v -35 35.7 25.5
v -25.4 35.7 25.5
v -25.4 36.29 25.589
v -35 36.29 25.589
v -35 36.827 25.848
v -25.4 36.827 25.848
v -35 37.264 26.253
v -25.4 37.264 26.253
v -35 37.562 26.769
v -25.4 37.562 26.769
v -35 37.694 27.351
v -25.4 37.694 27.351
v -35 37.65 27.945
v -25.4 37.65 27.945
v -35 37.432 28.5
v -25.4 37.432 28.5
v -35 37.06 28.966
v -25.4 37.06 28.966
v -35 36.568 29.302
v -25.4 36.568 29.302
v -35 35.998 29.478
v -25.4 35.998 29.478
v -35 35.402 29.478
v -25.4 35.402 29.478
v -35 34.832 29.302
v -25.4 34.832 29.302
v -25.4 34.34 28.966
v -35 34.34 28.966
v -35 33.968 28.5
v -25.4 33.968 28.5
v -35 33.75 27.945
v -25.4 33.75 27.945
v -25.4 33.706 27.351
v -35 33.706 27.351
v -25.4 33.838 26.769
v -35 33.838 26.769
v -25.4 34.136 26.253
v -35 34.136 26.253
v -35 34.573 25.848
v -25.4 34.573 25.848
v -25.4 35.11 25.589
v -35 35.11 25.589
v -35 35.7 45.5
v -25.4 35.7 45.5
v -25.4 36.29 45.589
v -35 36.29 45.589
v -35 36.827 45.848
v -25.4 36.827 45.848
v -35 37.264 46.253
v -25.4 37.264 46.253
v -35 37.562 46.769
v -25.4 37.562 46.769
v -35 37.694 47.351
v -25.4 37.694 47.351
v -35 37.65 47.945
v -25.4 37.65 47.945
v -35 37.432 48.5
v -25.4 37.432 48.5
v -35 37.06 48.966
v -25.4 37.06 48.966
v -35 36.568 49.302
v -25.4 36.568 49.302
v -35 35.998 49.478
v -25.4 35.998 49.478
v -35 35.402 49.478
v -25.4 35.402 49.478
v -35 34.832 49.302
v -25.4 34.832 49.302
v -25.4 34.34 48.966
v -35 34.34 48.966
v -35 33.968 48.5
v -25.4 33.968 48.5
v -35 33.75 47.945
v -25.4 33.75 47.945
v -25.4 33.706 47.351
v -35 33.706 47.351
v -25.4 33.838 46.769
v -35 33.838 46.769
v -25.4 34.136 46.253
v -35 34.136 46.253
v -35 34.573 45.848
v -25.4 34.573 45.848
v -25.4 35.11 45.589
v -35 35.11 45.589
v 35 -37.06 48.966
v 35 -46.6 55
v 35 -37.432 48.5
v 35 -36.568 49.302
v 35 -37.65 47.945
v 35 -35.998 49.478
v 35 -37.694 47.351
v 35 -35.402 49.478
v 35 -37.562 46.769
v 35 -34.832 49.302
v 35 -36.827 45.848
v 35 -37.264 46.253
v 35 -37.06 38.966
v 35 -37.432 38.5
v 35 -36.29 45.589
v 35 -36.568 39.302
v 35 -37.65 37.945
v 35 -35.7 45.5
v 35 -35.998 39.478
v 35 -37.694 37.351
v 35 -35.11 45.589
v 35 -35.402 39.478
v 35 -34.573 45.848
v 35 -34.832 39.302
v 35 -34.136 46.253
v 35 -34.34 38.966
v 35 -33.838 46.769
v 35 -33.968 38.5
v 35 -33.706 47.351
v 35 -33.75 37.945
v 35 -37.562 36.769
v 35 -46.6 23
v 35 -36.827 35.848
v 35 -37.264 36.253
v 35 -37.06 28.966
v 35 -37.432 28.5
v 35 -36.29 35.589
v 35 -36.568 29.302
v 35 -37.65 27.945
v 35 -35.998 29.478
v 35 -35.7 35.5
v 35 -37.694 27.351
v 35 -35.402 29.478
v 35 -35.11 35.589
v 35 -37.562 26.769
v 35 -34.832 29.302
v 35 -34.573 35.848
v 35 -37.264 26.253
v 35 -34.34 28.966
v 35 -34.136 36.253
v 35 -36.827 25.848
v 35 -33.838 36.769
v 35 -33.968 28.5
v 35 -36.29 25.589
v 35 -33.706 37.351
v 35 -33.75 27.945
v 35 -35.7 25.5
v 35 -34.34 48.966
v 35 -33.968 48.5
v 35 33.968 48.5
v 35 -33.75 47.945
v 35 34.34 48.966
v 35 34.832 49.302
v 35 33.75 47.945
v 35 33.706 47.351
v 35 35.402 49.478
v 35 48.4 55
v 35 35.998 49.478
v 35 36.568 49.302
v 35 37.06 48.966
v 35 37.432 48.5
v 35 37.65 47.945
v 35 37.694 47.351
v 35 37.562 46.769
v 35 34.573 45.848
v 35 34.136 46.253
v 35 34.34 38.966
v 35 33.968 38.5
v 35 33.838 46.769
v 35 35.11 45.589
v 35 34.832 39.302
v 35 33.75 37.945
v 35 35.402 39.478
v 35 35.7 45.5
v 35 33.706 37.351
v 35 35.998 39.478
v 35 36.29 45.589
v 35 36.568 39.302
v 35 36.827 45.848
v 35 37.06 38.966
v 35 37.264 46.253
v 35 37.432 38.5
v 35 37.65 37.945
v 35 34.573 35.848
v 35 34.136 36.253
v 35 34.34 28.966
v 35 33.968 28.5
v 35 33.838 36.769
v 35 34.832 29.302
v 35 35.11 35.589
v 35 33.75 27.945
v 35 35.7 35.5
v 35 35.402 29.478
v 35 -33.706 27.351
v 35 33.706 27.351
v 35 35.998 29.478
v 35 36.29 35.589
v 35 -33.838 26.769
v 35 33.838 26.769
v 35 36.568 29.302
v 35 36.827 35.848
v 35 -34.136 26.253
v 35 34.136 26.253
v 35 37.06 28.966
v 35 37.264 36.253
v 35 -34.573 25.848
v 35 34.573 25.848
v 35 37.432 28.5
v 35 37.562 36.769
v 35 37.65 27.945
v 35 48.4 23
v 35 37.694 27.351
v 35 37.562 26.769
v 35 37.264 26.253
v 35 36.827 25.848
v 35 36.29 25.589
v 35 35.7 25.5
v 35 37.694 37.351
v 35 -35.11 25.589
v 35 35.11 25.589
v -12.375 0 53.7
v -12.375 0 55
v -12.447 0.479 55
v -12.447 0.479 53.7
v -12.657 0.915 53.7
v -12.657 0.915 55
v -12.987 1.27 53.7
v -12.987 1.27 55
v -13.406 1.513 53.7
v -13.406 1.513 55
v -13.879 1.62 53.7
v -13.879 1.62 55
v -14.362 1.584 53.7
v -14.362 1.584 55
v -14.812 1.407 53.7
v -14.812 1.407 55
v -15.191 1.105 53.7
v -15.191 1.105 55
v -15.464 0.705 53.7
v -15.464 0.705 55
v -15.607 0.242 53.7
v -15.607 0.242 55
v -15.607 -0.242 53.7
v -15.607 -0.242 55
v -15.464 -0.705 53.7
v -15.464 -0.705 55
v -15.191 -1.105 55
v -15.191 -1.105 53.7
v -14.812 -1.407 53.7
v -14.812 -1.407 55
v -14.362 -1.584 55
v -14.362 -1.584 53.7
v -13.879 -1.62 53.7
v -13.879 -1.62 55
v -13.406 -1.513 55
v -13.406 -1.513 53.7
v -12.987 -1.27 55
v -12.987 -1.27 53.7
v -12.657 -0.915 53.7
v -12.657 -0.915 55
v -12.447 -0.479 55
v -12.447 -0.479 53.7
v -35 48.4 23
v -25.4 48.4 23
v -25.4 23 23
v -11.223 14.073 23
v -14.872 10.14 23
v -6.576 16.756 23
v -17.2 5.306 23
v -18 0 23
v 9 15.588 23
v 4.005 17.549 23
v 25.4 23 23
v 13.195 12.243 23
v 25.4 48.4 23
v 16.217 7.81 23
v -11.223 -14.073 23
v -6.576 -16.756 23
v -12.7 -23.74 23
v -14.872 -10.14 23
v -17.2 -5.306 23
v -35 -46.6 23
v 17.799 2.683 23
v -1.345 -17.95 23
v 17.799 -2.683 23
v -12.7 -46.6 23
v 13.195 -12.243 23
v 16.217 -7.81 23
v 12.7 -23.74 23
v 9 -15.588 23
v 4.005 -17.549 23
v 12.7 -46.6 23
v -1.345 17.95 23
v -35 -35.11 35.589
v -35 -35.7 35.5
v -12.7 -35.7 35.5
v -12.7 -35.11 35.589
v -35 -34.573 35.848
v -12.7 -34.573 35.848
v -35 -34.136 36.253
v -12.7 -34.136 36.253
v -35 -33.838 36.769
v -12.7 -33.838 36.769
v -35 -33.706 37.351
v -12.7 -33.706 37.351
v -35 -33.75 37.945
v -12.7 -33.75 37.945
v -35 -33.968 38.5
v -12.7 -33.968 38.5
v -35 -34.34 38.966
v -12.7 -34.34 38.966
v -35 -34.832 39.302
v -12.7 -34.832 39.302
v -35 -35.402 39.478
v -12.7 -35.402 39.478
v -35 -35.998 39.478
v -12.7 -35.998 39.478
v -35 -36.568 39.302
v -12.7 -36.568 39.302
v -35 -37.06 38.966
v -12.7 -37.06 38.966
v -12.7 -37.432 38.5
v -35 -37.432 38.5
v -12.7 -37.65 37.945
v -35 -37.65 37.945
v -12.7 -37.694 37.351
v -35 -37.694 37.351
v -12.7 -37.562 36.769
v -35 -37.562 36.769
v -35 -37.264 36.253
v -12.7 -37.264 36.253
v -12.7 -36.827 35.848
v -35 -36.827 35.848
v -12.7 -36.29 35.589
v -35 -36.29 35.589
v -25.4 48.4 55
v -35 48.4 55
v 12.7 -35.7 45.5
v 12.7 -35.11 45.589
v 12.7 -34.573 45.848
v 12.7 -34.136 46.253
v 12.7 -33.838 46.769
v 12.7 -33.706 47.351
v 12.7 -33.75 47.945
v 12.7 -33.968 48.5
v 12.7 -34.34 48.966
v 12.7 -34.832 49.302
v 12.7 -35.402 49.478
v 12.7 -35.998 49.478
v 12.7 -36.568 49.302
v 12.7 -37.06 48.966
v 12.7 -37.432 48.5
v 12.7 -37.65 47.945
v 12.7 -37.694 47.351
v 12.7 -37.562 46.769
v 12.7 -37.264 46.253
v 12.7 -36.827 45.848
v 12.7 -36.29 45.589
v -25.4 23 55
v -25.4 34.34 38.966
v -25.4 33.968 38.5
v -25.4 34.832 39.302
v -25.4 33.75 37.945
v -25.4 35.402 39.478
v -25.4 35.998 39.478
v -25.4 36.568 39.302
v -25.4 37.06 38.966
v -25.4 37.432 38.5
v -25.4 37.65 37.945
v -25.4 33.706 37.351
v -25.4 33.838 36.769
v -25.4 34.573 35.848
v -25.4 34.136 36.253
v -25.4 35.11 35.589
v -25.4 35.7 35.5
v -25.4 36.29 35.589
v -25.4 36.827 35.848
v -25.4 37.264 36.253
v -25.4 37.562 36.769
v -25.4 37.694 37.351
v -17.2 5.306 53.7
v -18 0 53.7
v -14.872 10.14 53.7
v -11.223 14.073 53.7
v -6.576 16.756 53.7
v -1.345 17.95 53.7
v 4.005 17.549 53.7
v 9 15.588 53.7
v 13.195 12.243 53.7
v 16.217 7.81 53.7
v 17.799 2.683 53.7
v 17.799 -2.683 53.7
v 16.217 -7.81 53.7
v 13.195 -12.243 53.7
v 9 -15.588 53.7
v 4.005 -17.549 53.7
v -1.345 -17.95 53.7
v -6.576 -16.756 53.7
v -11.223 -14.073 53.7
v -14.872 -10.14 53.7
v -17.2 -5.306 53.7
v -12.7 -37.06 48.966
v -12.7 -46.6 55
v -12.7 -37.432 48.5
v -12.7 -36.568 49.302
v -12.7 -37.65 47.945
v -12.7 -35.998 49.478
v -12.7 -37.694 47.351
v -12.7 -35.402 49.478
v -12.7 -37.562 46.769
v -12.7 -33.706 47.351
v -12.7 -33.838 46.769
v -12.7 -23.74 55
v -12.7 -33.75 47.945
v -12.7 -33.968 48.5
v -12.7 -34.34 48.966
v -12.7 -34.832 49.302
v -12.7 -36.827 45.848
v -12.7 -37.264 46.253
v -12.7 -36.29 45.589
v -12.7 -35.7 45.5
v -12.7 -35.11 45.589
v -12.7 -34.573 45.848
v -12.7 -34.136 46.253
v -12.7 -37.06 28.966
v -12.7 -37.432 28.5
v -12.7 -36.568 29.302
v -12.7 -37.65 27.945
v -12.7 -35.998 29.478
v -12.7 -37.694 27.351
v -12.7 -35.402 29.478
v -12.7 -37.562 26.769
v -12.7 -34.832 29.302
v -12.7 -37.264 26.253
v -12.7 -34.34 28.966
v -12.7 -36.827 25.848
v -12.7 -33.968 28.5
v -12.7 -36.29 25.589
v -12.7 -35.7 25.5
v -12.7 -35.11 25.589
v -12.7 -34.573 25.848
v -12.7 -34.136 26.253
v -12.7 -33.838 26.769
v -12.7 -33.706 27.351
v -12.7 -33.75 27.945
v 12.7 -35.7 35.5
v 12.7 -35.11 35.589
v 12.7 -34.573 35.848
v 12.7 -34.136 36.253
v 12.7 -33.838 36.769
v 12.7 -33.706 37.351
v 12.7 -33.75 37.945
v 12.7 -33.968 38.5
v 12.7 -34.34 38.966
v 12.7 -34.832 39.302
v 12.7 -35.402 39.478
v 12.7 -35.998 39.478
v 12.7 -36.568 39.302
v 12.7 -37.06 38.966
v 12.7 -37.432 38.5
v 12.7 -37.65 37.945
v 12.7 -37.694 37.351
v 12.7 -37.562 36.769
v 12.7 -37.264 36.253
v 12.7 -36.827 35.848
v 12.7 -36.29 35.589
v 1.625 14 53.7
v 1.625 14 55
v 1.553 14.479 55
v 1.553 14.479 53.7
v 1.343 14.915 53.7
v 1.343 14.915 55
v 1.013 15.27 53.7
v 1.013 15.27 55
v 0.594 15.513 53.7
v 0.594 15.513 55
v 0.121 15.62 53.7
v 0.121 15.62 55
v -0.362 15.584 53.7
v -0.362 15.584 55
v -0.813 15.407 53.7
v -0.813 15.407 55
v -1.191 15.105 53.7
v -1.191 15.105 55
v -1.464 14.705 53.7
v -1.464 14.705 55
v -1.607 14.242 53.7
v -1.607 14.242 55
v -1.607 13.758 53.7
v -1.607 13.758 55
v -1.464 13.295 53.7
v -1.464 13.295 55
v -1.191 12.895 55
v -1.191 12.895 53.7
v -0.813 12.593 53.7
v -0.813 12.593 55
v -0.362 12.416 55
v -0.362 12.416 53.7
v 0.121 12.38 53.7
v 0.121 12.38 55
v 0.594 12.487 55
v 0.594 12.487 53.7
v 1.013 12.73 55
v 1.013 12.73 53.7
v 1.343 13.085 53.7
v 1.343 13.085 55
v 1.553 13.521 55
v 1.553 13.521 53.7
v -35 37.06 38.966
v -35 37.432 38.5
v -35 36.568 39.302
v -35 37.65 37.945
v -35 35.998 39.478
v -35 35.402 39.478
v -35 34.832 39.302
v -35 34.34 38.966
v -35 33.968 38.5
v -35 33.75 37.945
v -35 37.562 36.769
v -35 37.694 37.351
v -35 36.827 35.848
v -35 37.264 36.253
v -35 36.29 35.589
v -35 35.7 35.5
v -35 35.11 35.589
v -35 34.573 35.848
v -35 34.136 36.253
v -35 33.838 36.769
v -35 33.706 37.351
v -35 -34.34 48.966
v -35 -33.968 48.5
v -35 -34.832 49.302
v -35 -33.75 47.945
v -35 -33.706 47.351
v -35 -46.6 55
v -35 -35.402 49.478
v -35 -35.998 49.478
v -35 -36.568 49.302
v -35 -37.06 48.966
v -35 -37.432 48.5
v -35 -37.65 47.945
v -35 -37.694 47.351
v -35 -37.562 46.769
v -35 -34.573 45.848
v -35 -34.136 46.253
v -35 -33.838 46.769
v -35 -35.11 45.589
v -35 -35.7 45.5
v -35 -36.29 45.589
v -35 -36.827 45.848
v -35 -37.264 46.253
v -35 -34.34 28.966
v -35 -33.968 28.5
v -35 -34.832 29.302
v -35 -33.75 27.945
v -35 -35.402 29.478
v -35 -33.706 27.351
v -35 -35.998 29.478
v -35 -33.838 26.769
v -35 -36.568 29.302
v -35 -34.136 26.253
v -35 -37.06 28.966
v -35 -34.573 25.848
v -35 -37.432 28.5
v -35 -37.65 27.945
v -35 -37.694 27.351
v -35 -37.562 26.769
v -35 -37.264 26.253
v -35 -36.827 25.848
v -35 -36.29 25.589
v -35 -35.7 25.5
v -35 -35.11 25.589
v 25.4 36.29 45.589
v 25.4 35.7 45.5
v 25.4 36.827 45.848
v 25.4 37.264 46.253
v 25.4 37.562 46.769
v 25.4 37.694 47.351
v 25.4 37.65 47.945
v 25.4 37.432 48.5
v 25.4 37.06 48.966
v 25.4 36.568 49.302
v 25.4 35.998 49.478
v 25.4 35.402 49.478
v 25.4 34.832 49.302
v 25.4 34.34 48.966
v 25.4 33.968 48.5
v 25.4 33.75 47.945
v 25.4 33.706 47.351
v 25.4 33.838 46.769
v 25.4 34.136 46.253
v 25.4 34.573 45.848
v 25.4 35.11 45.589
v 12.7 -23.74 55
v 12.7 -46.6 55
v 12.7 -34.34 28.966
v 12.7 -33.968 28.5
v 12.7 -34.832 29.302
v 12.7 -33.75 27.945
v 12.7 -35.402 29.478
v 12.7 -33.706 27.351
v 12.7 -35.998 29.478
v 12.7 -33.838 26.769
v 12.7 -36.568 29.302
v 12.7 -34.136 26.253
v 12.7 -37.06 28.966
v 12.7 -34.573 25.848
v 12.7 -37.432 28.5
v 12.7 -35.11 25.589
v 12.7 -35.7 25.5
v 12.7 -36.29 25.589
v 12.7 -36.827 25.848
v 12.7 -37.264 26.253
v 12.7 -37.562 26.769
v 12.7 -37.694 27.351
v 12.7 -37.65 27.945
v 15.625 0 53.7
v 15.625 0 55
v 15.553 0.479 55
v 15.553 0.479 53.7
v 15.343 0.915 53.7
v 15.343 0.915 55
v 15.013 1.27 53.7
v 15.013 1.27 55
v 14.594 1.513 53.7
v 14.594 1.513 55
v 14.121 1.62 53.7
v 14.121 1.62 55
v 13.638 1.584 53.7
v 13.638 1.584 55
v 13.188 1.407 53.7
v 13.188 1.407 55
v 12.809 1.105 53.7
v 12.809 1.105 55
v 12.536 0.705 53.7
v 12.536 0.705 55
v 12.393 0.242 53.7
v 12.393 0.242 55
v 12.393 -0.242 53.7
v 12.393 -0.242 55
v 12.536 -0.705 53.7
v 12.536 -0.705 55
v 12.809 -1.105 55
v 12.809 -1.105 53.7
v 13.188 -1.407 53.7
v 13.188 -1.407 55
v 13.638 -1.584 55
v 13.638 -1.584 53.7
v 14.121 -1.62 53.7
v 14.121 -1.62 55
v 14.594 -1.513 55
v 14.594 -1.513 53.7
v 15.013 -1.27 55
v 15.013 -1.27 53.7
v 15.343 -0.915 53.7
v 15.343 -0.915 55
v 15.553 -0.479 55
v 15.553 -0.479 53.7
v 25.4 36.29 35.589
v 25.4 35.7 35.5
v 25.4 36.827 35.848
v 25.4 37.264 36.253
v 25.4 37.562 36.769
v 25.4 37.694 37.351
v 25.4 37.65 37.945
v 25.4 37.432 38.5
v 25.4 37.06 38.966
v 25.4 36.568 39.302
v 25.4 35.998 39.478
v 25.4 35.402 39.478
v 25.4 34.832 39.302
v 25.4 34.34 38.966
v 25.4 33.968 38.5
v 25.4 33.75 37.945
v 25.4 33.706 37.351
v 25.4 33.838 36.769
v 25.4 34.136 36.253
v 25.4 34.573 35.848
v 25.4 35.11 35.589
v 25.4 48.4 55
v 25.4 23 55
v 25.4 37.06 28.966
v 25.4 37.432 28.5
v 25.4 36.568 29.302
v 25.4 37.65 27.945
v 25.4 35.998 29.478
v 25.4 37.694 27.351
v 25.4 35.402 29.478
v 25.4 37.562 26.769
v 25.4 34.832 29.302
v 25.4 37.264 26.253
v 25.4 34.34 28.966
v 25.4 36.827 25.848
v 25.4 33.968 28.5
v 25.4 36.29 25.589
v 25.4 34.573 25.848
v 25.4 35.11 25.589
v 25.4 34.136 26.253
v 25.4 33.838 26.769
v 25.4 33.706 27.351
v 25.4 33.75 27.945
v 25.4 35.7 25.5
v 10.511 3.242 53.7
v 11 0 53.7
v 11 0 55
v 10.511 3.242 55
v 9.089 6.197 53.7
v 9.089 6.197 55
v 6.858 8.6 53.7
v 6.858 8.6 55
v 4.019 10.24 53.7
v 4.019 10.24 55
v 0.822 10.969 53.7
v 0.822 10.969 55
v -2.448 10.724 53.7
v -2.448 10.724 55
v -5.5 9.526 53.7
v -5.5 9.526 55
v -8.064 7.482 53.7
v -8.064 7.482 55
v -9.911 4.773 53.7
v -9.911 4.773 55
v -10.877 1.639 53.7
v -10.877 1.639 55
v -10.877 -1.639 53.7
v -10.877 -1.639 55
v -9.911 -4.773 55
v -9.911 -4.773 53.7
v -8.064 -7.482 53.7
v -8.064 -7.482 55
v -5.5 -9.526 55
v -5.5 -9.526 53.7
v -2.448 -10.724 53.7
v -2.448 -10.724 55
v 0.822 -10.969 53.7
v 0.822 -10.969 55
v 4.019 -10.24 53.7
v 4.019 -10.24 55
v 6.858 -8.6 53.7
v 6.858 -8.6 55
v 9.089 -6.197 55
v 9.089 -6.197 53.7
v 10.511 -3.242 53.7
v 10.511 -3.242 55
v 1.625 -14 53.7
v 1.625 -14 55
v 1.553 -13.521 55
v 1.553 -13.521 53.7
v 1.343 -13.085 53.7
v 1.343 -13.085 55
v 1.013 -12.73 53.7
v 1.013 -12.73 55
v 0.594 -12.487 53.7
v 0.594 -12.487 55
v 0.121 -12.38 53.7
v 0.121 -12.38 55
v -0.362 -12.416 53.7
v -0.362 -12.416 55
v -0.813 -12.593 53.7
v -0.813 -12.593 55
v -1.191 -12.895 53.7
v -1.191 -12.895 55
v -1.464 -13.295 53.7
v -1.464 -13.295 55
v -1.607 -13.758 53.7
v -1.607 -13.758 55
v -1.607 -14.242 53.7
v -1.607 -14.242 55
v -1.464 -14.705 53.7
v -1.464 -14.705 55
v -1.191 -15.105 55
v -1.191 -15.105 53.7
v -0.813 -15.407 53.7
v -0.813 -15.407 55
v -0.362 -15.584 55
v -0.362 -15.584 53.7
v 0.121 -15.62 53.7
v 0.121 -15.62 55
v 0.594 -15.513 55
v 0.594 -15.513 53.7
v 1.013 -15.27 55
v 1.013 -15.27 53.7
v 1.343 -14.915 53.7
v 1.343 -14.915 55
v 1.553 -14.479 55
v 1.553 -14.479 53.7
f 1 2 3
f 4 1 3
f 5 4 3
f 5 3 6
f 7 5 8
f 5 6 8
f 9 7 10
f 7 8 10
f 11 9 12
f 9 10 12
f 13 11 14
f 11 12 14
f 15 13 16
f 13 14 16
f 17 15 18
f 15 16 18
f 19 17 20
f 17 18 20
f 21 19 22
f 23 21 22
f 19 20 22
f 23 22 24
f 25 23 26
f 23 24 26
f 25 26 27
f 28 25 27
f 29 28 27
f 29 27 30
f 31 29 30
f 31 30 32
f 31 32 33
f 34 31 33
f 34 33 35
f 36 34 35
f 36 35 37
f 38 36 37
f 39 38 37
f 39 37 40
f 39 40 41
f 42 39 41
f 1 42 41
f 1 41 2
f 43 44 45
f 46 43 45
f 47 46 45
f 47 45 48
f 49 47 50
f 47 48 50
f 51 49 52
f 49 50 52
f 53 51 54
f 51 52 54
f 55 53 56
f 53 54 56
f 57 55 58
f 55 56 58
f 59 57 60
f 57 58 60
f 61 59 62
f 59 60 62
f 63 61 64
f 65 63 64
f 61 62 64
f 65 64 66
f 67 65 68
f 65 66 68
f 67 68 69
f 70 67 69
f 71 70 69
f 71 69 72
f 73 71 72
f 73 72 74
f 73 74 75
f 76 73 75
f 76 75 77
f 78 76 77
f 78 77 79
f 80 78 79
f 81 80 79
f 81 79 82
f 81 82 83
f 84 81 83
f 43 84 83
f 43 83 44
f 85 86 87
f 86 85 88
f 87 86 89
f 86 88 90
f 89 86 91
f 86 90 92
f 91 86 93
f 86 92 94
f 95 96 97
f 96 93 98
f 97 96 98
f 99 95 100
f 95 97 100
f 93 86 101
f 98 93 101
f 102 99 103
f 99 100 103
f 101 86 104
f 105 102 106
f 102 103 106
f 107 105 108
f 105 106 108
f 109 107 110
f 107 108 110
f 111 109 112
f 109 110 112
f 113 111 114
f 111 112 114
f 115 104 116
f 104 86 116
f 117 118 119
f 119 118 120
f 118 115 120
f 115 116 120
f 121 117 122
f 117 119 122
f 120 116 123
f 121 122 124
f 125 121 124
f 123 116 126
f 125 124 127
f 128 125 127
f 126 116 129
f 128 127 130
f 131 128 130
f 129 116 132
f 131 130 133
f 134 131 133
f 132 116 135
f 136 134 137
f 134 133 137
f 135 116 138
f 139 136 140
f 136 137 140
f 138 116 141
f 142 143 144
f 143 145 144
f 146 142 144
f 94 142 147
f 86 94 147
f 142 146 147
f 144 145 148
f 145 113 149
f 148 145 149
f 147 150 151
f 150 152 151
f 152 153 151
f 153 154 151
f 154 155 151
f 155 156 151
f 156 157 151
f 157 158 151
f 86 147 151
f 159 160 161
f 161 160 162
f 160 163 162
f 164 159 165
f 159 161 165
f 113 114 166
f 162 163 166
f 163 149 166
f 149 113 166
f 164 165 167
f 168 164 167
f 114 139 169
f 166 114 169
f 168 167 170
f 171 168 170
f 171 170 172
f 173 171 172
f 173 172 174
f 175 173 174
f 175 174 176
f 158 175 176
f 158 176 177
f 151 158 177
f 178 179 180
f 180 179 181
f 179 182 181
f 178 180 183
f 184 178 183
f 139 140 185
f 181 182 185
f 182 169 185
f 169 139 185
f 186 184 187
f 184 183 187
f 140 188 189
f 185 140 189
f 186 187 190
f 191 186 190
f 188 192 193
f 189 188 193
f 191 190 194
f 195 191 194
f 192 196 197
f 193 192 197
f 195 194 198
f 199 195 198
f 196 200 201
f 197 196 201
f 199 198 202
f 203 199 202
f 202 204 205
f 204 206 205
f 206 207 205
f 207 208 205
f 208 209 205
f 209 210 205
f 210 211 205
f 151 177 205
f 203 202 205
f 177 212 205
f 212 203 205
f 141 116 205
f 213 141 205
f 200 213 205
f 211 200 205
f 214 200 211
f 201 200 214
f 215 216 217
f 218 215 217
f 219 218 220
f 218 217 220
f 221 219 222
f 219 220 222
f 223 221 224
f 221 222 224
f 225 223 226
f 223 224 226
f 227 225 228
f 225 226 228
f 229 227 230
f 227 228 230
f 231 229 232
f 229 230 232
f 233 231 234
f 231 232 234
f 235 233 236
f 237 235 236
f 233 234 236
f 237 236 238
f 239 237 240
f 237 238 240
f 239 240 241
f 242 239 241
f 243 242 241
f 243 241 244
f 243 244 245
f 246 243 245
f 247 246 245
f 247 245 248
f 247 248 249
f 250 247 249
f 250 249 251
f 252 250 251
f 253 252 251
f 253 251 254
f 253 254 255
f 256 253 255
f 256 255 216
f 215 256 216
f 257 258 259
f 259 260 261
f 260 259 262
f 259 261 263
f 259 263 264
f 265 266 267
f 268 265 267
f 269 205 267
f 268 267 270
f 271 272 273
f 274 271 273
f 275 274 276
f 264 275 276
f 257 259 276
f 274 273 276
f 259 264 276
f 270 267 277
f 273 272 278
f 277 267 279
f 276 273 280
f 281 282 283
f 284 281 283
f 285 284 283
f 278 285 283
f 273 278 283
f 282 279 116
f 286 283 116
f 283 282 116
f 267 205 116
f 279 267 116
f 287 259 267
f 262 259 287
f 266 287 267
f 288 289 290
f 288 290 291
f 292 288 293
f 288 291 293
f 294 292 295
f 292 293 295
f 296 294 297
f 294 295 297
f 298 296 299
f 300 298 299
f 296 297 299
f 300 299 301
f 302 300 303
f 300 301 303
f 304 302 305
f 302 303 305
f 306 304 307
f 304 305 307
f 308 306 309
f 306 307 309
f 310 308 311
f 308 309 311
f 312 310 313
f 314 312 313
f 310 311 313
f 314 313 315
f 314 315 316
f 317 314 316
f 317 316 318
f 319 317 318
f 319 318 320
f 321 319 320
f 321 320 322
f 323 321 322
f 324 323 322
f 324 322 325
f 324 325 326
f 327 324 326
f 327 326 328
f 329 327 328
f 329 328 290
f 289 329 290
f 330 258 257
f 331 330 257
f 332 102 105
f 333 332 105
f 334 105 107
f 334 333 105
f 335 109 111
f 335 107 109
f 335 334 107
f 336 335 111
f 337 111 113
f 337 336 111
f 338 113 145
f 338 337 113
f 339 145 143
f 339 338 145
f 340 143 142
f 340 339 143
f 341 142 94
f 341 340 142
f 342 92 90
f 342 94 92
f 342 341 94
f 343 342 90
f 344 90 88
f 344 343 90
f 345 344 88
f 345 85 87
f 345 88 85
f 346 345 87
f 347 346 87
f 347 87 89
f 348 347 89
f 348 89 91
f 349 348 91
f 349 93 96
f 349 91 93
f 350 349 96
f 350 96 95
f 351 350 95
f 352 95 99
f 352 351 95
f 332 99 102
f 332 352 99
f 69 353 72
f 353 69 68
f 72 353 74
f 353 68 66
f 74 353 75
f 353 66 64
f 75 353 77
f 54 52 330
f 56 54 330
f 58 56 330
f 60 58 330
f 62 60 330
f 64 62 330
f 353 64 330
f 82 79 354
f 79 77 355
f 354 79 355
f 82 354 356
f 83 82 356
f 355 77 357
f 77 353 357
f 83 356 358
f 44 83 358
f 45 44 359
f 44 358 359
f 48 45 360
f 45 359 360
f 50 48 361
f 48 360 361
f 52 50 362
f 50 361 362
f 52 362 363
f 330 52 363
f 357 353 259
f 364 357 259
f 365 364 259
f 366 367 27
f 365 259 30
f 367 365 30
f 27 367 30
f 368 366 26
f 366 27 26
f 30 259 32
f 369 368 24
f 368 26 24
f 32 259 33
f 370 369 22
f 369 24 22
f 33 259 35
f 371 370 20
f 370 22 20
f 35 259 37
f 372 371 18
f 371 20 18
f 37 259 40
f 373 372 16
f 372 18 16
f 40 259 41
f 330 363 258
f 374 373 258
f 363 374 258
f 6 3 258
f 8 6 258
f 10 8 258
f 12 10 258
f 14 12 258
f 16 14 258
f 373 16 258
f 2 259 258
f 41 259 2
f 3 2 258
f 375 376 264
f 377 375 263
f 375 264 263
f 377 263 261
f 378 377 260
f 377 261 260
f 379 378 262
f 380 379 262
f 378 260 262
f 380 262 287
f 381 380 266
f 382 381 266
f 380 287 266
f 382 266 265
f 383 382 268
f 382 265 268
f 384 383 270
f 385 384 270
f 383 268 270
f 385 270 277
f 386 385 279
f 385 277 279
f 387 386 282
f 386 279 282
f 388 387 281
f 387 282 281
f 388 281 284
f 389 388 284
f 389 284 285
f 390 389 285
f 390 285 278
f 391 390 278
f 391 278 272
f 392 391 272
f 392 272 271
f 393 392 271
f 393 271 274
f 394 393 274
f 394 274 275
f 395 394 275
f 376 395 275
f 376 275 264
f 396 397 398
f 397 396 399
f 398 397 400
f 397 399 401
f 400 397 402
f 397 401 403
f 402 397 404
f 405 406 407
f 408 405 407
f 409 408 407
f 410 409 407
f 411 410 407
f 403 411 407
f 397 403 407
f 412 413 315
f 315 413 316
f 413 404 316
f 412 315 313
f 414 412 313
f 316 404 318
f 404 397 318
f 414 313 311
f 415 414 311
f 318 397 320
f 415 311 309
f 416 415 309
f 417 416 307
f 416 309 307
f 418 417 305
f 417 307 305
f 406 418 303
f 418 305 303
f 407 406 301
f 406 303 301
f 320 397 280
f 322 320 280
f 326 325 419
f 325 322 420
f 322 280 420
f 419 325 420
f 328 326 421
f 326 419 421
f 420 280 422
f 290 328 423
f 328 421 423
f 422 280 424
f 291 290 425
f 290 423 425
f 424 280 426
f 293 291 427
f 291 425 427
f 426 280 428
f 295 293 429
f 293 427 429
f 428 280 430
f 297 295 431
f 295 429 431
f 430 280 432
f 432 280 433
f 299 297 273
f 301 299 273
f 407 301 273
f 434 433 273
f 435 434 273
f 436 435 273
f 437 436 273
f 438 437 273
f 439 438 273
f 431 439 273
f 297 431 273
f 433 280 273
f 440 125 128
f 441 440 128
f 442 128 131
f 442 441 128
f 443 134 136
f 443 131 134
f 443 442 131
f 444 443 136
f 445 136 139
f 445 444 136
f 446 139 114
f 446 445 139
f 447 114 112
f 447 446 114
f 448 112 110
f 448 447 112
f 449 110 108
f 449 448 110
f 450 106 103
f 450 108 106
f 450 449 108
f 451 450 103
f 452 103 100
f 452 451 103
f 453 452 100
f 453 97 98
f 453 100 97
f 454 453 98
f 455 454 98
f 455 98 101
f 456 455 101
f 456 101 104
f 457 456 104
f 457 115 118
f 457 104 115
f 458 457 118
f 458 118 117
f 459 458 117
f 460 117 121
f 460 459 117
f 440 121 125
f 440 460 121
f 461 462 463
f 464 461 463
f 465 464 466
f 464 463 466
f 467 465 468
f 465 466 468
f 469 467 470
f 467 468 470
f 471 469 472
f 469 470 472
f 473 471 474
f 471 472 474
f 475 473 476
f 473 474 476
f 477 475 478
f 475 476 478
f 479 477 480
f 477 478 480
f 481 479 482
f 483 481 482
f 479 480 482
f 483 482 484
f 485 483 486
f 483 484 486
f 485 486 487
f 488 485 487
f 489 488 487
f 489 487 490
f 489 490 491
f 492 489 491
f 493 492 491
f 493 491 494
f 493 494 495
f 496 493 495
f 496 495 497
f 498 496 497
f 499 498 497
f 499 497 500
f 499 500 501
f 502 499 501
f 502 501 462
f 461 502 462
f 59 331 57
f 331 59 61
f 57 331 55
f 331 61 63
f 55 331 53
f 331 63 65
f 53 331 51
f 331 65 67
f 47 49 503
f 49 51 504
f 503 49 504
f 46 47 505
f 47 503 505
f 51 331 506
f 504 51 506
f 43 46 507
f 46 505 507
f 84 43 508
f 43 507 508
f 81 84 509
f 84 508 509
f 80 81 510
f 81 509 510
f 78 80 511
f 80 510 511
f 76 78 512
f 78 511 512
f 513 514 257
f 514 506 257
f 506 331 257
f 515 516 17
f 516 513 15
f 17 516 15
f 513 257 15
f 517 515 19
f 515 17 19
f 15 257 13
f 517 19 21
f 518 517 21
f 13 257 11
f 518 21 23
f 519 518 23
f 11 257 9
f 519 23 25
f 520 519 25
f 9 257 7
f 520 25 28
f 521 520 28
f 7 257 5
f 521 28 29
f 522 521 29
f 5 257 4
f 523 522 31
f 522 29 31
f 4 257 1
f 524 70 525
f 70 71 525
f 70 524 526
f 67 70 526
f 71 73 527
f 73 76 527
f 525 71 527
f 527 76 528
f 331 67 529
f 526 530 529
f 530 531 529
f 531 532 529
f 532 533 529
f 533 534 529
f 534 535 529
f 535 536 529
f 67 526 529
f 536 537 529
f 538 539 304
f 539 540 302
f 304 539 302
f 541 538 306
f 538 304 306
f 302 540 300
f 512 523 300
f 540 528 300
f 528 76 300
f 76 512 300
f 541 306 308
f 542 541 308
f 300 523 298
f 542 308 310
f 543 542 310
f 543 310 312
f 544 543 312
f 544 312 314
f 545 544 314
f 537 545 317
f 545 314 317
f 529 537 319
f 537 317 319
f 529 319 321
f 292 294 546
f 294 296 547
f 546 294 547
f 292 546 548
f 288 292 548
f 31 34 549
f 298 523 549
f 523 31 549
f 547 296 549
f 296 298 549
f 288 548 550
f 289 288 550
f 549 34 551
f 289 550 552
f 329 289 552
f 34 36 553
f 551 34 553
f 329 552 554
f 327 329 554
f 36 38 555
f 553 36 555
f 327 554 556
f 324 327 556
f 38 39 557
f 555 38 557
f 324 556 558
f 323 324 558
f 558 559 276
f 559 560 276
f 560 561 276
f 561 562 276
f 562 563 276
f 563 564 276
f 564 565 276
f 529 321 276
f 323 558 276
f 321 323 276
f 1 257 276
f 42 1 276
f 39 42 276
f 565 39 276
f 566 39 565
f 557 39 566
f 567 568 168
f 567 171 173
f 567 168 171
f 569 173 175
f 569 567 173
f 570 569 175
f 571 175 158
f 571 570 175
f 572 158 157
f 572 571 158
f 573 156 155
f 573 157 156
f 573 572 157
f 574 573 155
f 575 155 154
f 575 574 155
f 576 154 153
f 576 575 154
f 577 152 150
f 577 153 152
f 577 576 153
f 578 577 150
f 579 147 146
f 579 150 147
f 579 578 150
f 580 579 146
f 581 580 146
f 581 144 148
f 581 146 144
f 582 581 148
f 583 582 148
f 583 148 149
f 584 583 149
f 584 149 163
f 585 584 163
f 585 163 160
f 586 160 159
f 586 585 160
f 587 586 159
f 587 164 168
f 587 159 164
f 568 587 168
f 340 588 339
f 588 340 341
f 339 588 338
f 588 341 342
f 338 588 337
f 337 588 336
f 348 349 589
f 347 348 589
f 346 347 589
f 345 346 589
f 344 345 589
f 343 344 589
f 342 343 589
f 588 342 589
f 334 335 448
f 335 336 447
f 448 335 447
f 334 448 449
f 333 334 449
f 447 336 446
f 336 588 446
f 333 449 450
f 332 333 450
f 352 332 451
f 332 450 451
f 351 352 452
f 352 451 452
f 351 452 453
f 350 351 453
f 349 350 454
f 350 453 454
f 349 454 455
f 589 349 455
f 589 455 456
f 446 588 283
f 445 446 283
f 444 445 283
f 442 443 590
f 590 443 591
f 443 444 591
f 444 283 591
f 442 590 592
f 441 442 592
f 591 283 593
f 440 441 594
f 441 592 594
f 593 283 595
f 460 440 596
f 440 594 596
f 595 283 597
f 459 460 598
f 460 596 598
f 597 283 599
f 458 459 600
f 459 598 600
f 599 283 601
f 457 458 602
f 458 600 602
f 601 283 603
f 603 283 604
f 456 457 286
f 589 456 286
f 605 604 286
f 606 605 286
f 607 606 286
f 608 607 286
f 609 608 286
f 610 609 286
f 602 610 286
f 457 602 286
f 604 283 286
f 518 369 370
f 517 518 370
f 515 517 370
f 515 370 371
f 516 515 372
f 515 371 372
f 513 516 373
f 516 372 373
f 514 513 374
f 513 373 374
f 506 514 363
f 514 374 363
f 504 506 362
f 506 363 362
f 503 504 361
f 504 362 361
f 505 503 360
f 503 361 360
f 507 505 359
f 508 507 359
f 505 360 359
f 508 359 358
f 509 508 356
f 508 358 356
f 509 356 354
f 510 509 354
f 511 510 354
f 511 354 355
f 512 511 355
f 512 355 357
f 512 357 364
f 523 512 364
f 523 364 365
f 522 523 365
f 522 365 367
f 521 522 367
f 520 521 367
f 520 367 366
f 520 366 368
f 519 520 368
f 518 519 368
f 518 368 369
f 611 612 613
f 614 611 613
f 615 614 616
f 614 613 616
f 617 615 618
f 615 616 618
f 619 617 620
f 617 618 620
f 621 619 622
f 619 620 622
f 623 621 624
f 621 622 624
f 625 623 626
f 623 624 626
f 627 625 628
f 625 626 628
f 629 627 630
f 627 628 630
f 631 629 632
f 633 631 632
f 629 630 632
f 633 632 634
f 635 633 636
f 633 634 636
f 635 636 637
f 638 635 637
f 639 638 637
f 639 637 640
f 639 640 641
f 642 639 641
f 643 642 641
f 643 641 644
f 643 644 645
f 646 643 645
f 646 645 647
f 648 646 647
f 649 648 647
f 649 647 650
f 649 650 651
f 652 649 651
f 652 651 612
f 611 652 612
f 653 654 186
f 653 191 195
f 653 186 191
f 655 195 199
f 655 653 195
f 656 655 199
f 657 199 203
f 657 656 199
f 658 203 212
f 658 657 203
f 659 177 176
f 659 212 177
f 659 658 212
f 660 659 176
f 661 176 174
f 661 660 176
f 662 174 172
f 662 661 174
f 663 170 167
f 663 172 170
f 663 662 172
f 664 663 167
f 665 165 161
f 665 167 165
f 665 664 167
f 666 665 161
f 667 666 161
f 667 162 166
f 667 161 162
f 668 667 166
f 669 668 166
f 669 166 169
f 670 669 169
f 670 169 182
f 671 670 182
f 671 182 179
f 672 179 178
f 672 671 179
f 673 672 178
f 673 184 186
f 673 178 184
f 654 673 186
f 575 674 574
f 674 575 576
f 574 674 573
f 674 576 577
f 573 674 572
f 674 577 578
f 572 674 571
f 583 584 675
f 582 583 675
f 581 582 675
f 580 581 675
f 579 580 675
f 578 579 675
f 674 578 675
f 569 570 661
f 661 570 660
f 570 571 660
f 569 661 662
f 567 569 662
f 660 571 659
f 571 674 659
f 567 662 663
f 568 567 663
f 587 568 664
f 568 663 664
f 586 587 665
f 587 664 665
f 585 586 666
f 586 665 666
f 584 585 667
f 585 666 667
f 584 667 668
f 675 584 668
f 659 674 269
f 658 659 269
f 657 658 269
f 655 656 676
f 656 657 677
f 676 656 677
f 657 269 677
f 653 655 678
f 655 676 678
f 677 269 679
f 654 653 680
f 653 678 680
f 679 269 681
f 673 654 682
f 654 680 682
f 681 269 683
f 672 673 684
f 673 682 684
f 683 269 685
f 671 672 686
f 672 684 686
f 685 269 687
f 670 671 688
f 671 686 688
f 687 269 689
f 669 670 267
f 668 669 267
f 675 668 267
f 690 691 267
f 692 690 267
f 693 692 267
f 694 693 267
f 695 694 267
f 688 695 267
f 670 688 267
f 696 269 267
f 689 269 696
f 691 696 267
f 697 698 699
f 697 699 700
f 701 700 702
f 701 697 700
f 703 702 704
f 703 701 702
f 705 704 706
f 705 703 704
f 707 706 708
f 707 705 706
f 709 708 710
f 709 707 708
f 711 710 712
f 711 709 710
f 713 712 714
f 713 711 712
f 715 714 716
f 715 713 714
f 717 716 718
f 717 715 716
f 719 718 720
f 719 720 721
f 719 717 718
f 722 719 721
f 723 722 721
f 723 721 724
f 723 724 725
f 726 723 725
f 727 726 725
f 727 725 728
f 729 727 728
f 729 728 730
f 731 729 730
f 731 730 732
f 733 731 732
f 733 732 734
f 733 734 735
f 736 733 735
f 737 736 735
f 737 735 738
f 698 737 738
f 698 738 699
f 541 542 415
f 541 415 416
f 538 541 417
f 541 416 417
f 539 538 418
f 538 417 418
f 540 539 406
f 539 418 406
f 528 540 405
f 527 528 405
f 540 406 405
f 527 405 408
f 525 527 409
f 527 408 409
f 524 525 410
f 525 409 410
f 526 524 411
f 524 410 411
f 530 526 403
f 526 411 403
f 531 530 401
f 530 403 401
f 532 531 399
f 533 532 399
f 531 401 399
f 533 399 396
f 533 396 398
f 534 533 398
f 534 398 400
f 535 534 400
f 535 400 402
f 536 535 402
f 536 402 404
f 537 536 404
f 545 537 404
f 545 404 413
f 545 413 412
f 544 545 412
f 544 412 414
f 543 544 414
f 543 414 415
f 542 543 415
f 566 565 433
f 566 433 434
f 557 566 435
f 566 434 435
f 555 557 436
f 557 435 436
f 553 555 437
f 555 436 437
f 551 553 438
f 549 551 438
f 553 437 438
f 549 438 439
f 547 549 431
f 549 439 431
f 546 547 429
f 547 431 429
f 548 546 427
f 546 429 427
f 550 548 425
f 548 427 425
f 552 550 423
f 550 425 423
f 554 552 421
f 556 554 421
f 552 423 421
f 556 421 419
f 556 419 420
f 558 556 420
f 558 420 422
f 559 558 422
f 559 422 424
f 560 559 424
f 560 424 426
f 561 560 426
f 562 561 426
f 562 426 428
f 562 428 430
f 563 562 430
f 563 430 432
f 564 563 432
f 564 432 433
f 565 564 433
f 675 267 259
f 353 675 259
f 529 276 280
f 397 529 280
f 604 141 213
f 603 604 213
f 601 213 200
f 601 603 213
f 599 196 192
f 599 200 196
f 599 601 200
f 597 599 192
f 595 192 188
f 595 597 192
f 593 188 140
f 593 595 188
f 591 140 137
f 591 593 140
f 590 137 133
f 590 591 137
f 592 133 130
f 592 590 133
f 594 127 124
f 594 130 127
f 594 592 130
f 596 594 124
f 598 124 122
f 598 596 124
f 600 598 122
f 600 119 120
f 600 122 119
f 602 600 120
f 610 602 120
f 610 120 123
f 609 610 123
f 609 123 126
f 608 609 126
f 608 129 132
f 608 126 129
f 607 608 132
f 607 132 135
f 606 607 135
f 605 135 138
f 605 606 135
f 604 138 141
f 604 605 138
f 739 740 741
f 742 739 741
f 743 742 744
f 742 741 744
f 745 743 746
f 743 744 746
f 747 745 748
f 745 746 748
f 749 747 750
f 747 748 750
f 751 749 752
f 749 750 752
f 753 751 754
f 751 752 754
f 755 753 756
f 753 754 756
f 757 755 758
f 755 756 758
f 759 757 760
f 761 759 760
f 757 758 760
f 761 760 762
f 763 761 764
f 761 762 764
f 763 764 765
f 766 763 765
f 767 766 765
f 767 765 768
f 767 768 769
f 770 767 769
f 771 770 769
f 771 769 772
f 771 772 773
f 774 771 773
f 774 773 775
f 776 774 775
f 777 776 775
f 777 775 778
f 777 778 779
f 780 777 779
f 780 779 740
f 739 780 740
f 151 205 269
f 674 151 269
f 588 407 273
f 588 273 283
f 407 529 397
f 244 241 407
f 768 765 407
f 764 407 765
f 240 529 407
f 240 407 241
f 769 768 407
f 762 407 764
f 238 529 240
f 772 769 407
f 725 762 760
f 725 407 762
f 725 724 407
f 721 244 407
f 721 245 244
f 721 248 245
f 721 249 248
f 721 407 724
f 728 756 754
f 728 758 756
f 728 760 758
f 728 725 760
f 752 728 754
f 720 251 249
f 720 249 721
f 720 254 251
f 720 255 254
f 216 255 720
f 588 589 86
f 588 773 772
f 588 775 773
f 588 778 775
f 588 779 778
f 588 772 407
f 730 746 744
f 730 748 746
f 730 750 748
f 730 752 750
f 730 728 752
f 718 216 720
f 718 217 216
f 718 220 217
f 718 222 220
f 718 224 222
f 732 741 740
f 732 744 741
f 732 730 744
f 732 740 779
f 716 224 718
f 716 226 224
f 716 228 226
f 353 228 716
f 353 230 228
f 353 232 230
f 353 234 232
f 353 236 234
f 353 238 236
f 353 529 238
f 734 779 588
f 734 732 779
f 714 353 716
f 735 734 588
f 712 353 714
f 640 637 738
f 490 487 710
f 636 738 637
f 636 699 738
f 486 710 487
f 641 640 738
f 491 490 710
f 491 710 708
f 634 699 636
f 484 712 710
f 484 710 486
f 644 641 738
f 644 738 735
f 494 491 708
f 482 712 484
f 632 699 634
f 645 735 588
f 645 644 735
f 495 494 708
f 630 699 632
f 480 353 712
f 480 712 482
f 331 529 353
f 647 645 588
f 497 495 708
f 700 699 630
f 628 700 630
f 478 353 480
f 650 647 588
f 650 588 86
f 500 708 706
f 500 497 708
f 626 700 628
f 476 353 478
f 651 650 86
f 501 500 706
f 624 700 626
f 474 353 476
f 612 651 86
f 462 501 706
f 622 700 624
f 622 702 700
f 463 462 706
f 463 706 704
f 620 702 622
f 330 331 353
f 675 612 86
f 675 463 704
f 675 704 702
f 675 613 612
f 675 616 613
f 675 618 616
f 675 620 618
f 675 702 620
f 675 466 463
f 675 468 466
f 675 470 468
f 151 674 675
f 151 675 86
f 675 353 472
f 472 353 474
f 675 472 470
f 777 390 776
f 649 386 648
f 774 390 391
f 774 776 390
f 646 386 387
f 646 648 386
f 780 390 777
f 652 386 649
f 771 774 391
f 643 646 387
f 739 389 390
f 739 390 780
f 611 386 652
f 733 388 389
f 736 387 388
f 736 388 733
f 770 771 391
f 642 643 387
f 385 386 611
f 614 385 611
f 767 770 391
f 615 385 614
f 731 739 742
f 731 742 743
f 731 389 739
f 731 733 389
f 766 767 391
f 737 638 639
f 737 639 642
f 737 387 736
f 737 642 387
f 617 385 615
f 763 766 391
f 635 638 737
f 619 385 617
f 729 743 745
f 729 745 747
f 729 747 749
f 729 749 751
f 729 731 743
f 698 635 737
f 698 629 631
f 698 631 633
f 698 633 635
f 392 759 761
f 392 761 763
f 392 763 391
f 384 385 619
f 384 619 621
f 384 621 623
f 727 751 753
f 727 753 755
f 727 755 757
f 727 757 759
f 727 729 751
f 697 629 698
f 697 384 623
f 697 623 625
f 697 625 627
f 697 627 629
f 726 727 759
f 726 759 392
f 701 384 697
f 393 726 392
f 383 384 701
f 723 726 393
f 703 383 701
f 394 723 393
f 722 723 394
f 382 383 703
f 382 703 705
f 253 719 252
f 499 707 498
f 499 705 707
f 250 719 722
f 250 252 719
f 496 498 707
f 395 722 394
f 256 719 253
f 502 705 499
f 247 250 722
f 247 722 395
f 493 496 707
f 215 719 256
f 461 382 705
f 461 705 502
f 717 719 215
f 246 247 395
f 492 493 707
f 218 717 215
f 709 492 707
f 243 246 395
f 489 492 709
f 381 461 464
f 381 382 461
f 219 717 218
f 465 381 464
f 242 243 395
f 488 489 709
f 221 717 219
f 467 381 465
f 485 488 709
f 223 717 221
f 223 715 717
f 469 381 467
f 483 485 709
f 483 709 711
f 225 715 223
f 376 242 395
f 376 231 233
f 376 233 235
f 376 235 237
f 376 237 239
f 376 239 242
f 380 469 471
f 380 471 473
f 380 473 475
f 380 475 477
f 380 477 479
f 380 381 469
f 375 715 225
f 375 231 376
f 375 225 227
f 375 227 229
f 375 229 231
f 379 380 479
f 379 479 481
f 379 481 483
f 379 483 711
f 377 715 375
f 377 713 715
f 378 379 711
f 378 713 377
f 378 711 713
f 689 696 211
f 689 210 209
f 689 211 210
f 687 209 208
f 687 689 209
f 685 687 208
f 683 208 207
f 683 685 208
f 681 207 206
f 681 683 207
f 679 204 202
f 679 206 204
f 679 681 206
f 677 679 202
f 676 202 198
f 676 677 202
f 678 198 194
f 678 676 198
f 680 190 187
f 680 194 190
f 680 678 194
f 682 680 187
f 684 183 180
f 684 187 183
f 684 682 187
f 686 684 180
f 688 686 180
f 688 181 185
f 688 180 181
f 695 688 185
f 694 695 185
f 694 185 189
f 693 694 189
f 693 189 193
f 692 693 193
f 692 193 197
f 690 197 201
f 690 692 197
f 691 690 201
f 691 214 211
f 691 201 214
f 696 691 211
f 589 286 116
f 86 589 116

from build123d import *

# Parameters (mm, degrees)
SKETCH1_R               = 11
BOSS_EXTRUDE1_DEPTH     = 55
SKETCH2_R               = 18
CUT_EXTRUDE1_DEPTH      = 53.7
SKETCH4_R               = 1.625
CUT_EXTRUDE2_DEPTH      = 56
SKETCH5_R               = 2
CUT_EXTRUDE3_DEPTH      = 36
CUT_EXTRUDE3_DEPTH_BACK = 36
CUT_EXTRUDE4_DEPTH      = 74


with BuildPart() as part:
    # Sketch1 → Boss-Extrude1 (new body)
    with BuildSketch(Plane.XY):
        Polygon((-12.7, -23.74), (12.7, -23.74), (12.7, -46.6), (35, -46.6), (35, -20), (35, 48.4), (25.4, 48.4), (25.4, 23), (-25.4, 23), (-25.4, 48.4), (-35, 48.4), (-35, -24.5), (-35, -46.6), (-12.7, -46.6), align=None)
        Circle(SKETCH1_R, mode=Mode.SUBTRACT)
    extrude(amount=BOSS_EXTRUDE1_DEPTH)

    # Sketch2 → Cut-Extrude1 (cut)
    with BuildSketch(Plane(origin=(0, 0, 0), x_dir=(-1, 0, 0), z_dir=(0, 0, -1))):
        Circle(SKETCH2_R)
    extrude(amount=-CUT_EXTRUDE1_DEPTH, mode=Mode.SUBTRACT)

    # Sketch4 → Cut-Extrude2 (cut, through all)
    with BuildSketch(Plane.XY.offset(55)):
        with Locations((0, 14)):
            Circle(SKETCH4_R)
        with Locations((14, 0)):
            Circle(SKETCH4_R)
        with Locations((0, -14)):
            Circle(SKETCH4_R)
        with Locations((-14, 0)):
            Circle(SKETCH4_R)
    extrude(amount=-CUT_EXTRUDE2_DEPTH, mode=Mode.SUBTRACT)

    # Sketch5 → Cut-Extrude3 (cut, two sides)
    with BuildSketch(Plane(origin=(0, 0, 0), x_dir=(0, 0, -1), z_dir=(1, 0, 0))) as cut_extrude3_sk:
        with Locations((-27.5, -35.7)):
            Circle(SKETCH5_R)
        with Locations((-17.5, -35.7)):
            Circle(SKETCH5_R)
        with Locations((-7.5, -35.7)):
            Circle(SKETCH5_R)
        with Locations((-37.5, -35.7)):
            Circle(SKETCH5_R)
        with Locations((-47.5, -35.7)):
            Circle(SKETCH5_R)
        with Locations((-27.5, 35.7)):
            Circle(SKETCH5_R)
        with Locations((-37.5, 35.7)):
            Circle(SKETCH5_R)
        with Locations((-47.5, 35.7)):
            Circle(SKETCH5_R)
        with Locations((-17.5, 35.7)):
            Circle(SKETCH5_R)
        with Locations((-7.5, 35.7)):
            Circle(SKETCH5_R)
    extrude(amount=CUT_EXTRUDE3_DEPTH, mode=Mode.SUBTRACT)
    extrude(cut_extrude3_sk.sketch, amount=-CUT_EXTRUDE3_DEPTH_BACK, mode=Mode.SUBTRACT)

    # Sketch6 → Cut-Extrude4 (cut)
    with BuildSketch(Plane(origin=(35, 0, 0), x_dir=(0, 0, -1), z_dir=(1, 0, 0))):
        Polygon((-23, -1.1), (-23, 51.285793323), (26.639959918, 51.285793323), (26.639959918, -56.994126514), (-23, -56.994126514), align=None)
    extrude(amount=-CUT_EXTRUDE4_DEPTH, mode=Mode.SUBTRACT)


solid = part.part
